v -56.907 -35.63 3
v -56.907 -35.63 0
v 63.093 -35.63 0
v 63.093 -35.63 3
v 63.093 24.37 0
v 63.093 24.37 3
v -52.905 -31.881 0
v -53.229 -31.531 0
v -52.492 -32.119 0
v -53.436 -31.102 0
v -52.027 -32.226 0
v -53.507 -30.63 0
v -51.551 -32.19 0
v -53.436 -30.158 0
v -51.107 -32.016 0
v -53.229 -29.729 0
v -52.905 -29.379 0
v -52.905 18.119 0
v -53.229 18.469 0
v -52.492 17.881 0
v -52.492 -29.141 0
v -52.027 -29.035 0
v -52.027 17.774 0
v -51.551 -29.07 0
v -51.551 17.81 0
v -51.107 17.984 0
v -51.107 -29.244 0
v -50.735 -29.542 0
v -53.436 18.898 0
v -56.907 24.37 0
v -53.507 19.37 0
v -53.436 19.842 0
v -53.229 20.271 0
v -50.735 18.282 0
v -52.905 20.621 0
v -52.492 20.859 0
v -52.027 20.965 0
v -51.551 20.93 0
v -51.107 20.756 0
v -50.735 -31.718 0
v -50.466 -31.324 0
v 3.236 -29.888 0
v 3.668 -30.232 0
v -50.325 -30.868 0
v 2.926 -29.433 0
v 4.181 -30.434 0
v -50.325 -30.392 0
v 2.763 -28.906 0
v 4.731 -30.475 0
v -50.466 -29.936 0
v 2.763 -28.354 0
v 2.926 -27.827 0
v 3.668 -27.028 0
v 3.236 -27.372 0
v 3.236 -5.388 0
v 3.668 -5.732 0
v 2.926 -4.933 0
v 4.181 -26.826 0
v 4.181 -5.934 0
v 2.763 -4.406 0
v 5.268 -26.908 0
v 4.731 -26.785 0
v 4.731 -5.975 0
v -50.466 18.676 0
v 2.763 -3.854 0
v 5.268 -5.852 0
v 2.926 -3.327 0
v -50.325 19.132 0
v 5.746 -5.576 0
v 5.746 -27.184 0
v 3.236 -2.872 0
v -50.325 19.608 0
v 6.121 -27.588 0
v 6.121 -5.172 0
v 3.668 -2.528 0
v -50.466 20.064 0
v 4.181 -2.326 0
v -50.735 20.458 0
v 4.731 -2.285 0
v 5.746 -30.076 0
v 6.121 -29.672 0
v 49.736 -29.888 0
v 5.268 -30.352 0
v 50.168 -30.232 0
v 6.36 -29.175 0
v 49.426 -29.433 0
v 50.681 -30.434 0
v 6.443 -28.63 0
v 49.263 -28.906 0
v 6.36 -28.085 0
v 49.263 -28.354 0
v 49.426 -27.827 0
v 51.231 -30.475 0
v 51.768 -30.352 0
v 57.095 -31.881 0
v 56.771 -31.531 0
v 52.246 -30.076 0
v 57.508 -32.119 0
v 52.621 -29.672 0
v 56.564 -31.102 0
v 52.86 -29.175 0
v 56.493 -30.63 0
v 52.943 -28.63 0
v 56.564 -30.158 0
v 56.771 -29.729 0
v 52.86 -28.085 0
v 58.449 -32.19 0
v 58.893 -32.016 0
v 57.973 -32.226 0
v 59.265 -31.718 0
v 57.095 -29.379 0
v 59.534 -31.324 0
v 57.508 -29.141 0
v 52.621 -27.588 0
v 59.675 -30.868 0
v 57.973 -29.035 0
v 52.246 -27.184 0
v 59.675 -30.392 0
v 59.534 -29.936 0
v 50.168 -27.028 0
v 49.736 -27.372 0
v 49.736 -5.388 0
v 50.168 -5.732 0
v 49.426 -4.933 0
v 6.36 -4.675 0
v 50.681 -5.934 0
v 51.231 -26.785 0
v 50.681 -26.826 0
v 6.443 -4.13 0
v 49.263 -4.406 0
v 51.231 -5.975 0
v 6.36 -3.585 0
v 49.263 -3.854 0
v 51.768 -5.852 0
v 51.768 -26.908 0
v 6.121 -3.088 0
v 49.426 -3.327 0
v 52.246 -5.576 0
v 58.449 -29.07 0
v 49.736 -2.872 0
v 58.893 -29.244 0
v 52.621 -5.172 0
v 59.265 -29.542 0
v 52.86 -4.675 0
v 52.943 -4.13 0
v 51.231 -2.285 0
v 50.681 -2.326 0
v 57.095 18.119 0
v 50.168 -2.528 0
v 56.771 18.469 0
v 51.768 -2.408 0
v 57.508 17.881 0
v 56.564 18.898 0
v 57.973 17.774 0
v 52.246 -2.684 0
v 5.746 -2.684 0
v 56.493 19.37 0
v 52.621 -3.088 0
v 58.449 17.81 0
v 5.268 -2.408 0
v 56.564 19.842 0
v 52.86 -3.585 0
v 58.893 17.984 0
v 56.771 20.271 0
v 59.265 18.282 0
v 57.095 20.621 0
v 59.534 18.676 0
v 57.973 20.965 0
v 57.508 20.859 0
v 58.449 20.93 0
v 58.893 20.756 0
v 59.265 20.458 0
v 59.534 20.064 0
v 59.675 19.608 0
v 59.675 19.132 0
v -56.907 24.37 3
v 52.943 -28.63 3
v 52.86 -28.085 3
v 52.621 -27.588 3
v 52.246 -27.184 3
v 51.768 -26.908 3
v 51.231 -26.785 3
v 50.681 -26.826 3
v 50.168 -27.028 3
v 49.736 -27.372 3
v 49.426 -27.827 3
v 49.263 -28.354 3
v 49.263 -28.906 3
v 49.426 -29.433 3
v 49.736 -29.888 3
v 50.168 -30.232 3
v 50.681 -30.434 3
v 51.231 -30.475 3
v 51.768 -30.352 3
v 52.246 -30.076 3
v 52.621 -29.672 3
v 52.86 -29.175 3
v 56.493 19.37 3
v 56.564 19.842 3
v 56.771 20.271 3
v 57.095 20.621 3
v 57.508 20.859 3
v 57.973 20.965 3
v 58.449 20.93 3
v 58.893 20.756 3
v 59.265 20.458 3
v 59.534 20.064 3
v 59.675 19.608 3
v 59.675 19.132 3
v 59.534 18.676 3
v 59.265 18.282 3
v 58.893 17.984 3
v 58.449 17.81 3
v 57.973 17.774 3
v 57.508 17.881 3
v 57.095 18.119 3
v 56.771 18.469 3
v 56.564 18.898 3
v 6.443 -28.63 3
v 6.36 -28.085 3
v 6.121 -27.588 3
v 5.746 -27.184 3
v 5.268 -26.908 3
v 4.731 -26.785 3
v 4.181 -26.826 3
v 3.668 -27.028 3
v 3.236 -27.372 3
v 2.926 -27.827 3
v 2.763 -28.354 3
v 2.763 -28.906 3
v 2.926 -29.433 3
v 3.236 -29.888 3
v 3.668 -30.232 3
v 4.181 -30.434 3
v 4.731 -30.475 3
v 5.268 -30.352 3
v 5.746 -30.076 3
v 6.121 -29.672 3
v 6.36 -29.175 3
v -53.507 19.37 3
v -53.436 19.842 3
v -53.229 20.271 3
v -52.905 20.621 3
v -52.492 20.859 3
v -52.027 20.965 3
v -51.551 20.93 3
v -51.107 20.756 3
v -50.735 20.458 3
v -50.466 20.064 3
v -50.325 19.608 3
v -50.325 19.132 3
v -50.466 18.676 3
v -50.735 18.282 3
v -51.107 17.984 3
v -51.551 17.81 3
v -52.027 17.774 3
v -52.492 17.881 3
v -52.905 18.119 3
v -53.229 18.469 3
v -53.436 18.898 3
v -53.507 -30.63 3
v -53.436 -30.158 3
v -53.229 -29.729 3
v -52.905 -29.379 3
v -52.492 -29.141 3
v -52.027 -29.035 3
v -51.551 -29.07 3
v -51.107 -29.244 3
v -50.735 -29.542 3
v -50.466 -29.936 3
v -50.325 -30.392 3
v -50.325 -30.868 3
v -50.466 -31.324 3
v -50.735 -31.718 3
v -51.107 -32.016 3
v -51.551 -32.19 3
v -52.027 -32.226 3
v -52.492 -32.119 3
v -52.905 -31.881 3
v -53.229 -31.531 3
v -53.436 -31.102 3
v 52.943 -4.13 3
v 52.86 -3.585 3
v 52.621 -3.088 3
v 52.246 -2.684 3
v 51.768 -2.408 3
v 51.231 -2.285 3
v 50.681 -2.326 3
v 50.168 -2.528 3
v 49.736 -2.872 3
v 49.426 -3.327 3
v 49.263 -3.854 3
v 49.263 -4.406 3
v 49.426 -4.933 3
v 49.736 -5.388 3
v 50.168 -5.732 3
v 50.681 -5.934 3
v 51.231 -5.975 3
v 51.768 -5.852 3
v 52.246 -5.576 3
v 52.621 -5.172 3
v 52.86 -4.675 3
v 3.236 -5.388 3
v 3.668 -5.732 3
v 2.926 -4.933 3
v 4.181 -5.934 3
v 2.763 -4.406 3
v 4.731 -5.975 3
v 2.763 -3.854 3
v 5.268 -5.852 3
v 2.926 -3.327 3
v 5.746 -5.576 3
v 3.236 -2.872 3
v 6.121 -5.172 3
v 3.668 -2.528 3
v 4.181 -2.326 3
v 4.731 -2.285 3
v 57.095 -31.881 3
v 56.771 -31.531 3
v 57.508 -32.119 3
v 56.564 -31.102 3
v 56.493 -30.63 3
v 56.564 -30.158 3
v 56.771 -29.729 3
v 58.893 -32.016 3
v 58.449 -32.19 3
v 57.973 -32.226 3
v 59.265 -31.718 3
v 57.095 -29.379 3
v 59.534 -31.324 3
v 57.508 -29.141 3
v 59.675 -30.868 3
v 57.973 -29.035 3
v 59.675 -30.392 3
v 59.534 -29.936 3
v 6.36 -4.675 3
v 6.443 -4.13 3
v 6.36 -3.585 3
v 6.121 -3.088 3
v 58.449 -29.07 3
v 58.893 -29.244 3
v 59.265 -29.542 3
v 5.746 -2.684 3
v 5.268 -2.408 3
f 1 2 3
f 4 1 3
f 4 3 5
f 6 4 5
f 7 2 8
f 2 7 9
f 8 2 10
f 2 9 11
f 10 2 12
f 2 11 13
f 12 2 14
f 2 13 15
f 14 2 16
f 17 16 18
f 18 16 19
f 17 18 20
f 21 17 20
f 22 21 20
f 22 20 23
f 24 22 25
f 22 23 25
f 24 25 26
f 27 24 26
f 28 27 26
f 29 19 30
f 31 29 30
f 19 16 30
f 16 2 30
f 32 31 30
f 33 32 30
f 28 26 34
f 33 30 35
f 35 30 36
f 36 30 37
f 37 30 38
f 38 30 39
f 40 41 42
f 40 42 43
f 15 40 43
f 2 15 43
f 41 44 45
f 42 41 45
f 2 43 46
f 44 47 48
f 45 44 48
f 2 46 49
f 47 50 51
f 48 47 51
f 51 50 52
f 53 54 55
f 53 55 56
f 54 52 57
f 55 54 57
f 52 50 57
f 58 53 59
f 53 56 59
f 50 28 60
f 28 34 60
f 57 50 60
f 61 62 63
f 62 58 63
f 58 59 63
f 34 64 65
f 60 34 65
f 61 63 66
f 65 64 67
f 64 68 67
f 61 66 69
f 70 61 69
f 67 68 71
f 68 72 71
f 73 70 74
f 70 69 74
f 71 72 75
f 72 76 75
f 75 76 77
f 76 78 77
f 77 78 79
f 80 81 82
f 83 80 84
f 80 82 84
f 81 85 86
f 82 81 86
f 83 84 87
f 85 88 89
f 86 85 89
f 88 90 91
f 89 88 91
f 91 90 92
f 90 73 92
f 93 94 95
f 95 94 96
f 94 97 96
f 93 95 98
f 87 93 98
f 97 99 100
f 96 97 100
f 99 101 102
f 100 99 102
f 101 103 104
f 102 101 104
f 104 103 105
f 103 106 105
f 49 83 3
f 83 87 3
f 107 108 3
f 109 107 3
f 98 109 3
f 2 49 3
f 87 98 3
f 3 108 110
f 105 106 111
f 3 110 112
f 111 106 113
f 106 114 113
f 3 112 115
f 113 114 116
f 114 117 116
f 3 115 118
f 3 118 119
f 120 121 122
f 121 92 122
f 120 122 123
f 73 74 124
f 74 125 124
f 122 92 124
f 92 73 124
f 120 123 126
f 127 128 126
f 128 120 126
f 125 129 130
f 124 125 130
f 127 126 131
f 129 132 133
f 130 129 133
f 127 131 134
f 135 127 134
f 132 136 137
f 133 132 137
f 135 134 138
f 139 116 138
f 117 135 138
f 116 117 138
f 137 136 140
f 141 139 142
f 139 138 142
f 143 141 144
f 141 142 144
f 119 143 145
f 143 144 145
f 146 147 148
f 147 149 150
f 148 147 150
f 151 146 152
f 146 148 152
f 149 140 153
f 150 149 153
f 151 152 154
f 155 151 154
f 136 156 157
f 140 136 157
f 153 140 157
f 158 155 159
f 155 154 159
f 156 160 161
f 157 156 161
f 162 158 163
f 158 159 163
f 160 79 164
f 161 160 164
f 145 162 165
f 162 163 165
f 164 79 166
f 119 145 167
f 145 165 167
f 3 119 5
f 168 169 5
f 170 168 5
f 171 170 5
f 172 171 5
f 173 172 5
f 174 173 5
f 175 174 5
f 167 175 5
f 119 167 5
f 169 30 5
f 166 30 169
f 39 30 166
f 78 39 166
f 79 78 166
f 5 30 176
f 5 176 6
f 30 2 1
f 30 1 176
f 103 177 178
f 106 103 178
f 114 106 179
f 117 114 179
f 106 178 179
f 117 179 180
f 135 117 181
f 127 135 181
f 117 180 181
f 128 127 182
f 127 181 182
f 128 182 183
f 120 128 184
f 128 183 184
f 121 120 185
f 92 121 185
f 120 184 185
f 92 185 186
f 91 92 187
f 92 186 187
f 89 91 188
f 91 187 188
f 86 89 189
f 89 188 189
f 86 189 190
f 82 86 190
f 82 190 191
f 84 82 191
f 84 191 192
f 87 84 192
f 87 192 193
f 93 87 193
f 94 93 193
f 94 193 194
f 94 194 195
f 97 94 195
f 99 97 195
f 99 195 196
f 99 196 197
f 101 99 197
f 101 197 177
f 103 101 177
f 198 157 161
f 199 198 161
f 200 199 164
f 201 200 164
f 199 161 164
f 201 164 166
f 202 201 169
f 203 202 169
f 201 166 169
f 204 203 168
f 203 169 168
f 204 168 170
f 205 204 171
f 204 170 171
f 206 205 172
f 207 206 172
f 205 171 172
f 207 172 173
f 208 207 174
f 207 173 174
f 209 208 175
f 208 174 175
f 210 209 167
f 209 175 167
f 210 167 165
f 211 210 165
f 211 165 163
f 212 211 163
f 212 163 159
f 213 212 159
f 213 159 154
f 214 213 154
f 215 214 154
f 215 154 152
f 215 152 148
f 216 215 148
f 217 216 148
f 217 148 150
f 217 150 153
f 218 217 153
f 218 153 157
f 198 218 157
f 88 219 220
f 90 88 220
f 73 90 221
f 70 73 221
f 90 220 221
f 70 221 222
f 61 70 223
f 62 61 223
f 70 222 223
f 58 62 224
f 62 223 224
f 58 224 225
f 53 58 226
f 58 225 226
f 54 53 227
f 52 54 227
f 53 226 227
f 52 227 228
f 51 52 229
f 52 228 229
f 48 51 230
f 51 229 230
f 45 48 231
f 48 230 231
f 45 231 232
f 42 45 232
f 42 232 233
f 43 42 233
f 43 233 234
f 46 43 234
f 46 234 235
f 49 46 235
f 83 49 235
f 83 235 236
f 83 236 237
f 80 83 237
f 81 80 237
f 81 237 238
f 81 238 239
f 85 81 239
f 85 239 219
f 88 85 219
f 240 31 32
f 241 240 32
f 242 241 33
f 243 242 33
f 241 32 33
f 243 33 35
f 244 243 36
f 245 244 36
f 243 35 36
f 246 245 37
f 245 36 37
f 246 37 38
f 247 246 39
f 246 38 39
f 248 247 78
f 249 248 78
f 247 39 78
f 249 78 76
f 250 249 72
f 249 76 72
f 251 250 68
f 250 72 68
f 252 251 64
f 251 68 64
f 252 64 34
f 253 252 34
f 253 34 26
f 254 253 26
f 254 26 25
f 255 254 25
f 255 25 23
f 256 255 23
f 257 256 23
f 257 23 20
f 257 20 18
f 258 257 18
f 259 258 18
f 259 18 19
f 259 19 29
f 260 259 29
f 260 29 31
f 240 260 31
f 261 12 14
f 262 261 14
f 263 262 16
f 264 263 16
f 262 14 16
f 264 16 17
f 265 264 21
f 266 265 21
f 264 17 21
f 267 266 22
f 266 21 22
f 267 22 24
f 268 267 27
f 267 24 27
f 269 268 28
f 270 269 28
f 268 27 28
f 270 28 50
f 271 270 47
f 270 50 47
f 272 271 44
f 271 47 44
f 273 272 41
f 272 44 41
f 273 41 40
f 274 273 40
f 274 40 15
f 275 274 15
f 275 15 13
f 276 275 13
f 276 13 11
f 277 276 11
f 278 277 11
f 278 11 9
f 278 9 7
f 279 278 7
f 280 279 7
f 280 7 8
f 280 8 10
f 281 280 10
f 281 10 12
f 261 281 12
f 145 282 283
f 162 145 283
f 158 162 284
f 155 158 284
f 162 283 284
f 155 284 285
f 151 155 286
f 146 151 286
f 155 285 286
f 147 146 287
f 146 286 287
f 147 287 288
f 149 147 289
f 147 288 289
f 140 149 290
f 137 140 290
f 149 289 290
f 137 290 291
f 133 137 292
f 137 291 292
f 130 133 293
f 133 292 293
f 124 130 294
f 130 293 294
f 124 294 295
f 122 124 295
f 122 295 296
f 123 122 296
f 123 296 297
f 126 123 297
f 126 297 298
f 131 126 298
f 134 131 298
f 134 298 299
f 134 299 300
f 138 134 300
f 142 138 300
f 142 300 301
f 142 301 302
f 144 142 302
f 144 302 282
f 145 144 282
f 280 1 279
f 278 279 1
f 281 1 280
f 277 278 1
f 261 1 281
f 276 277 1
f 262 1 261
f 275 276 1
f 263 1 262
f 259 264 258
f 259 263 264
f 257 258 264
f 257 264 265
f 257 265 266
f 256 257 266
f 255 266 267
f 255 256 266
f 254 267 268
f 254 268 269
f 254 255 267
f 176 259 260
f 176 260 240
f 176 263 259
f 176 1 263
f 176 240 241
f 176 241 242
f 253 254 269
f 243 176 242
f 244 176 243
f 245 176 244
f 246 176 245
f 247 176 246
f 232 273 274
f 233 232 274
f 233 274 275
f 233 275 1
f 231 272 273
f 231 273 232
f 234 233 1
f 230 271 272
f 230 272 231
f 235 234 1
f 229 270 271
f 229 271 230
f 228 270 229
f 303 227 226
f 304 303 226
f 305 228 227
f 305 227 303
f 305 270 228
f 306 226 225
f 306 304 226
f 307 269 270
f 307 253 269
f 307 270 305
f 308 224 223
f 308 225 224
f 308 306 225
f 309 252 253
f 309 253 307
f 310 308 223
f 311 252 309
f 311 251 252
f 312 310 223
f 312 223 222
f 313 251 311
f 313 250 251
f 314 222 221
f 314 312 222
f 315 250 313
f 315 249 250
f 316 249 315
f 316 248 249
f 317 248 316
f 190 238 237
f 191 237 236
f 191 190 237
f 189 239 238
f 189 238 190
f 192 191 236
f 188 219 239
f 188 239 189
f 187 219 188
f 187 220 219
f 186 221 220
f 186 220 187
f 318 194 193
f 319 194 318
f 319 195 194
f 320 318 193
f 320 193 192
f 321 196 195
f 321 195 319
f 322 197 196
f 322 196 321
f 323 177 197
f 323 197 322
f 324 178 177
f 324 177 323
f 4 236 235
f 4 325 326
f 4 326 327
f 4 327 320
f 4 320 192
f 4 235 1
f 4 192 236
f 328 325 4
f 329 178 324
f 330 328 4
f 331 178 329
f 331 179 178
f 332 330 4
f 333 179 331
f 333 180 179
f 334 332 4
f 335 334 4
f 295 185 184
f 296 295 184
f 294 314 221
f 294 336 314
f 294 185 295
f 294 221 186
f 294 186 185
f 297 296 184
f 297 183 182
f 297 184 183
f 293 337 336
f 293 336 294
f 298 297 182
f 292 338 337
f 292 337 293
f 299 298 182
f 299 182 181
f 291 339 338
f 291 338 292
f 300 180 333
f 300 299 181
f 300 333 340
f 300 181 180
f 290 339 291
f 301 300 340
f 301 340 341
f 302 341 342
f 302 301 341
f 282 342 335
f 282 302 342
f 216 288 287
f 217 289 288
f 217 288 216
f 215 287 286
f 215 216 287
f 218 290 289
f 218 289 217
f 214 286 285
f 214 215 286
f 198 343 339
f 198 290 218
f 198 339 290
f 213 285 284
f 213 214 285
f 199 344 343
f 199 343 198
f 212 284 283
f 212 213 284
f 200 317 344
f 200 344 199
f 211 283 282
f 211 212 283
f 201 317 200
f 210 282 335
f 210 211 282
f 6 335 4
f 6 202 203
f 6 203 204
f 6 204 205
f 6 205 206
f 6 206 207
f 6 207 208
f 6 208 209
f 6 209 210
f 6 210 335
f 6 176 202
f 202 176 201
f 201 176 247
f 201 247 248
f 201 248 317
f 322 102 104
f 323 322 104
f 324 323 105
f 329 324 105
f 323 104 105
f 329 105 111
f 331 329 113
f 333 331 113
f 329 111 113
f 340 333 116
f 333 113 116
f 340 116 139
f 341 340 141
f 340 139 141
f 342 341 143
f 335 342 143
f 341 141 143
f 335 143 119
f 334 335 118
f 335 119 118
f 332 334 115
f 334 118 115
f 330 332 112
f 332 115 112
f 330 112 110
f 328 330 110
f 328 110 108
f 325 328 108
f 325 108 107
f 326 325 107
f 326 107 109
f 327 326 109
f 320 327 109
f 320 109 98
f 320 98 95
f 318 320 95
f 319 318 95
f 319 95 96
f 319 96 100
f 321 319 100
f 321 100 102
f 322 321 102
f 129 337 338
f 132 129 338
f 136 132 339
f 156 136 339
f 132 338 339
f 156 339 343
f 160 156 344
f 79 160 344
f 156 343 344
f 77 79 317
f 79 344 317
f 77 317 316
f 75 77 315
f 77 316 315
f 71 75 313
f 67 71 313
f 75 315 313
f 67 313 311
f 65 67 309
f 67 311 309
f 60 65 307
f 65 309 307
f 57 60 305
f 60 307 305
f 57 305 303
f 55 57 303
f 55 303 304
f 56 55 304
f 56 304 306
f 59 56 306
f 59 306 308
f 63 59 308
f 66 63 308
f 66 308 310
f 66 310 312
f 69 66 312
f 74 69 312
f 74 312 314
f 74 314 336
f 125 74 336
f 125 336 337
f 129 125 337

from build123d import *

# Parameters (mm, degrees)
SKETCH1_W           = 120
SKETCH1_H           = 60
BOSS_EXTRUDE1_DEPTH = 3
SKETCH3_R           = 1.85
CUT_EXTRUDE1_DEPTH  = 73.520148402
SKETCH4_R           = 1.5
CUT_EXTRUDE2_DEPTH  = 73.520148402
SKETCH5_R           = 1.6
CUT_EXTRUDE3_DEPTH  = 10


with BuildPart() as part:
    # Sketch1 → Boss-Extrude1 (new body)
    with BuildSketch(Plane.XY):
        with Locations((3.092575742, -5.63002681)):
            Rectangle(SKETCH1_W, SKETCH1_H)
    extrude(amount=BOSS_EXTRUDE1_DEPTH)

    # Sketch3 → Cut-Extrude1 (cut, through all)
    with BuildSketch(Plane.XY.offset(3)):
        with Locations((4.592575742, -4.13002681)):
            Circle(SKETCH3_R)
        with Locations((51.092575742, -4.13002681)):
            Circle(SKETCH3_R)
        with Locations((51.092575742, -28.63002681)):
            Circle(SKETCH3_R)
        with Locations((4.592575742, -28.63002681)):
            Circle(SKETCH3_R)
    extrude(amount=-CUT_EXTRUDE1_DEPTH, mode=Mode.SUBTRACT)

    # Sketch4 → Cut-Extrude2 (cut, through all)
    with BuildSketch(Plane.XY.offset(3)):
        with Locations((-51.907424258, 19.36997319)):
            Circle(SKETCH4_R)
        with Locations((58.092575742, 19.36997319)):
            Circle(SKETCH4_R)
        with Locations((58.092575742, -30.63002681)):
            Circle(SKETCH4_R)
        with Locations((-51.907424258, -30.63002681)):
            Circle(SKETCH4_R)
    extrude(amount=-CUT_EXTRUDE2_DEPTH, mode=Mode.SUBTRACT)

    # Sketch5 → Cut-Extrude3 (cut)
    with BuildSketch(Plane(origin=(0, 0, 0), x_dir=(-1, 0, 0), z_dir=(0, 0, -1))):
        with Locations((-58.092575742, 19.36997319)):
            Circle(SKETCH5_R)
        with Locations((-58.092575742, -30.63002681)):
            Circle(SKETCH5_R)
        with Locations((51.907424258, -30.63002681)):
            Circle(SKETCH5_R)
        with Locations((51.907424258, 19.36997319)):
            Circle(SKETCH5_R)
    extrude(amount=-CUT_EXTRUDE3_DEPTH, mode=Mode.SUBTRACT)


solid = part.part
